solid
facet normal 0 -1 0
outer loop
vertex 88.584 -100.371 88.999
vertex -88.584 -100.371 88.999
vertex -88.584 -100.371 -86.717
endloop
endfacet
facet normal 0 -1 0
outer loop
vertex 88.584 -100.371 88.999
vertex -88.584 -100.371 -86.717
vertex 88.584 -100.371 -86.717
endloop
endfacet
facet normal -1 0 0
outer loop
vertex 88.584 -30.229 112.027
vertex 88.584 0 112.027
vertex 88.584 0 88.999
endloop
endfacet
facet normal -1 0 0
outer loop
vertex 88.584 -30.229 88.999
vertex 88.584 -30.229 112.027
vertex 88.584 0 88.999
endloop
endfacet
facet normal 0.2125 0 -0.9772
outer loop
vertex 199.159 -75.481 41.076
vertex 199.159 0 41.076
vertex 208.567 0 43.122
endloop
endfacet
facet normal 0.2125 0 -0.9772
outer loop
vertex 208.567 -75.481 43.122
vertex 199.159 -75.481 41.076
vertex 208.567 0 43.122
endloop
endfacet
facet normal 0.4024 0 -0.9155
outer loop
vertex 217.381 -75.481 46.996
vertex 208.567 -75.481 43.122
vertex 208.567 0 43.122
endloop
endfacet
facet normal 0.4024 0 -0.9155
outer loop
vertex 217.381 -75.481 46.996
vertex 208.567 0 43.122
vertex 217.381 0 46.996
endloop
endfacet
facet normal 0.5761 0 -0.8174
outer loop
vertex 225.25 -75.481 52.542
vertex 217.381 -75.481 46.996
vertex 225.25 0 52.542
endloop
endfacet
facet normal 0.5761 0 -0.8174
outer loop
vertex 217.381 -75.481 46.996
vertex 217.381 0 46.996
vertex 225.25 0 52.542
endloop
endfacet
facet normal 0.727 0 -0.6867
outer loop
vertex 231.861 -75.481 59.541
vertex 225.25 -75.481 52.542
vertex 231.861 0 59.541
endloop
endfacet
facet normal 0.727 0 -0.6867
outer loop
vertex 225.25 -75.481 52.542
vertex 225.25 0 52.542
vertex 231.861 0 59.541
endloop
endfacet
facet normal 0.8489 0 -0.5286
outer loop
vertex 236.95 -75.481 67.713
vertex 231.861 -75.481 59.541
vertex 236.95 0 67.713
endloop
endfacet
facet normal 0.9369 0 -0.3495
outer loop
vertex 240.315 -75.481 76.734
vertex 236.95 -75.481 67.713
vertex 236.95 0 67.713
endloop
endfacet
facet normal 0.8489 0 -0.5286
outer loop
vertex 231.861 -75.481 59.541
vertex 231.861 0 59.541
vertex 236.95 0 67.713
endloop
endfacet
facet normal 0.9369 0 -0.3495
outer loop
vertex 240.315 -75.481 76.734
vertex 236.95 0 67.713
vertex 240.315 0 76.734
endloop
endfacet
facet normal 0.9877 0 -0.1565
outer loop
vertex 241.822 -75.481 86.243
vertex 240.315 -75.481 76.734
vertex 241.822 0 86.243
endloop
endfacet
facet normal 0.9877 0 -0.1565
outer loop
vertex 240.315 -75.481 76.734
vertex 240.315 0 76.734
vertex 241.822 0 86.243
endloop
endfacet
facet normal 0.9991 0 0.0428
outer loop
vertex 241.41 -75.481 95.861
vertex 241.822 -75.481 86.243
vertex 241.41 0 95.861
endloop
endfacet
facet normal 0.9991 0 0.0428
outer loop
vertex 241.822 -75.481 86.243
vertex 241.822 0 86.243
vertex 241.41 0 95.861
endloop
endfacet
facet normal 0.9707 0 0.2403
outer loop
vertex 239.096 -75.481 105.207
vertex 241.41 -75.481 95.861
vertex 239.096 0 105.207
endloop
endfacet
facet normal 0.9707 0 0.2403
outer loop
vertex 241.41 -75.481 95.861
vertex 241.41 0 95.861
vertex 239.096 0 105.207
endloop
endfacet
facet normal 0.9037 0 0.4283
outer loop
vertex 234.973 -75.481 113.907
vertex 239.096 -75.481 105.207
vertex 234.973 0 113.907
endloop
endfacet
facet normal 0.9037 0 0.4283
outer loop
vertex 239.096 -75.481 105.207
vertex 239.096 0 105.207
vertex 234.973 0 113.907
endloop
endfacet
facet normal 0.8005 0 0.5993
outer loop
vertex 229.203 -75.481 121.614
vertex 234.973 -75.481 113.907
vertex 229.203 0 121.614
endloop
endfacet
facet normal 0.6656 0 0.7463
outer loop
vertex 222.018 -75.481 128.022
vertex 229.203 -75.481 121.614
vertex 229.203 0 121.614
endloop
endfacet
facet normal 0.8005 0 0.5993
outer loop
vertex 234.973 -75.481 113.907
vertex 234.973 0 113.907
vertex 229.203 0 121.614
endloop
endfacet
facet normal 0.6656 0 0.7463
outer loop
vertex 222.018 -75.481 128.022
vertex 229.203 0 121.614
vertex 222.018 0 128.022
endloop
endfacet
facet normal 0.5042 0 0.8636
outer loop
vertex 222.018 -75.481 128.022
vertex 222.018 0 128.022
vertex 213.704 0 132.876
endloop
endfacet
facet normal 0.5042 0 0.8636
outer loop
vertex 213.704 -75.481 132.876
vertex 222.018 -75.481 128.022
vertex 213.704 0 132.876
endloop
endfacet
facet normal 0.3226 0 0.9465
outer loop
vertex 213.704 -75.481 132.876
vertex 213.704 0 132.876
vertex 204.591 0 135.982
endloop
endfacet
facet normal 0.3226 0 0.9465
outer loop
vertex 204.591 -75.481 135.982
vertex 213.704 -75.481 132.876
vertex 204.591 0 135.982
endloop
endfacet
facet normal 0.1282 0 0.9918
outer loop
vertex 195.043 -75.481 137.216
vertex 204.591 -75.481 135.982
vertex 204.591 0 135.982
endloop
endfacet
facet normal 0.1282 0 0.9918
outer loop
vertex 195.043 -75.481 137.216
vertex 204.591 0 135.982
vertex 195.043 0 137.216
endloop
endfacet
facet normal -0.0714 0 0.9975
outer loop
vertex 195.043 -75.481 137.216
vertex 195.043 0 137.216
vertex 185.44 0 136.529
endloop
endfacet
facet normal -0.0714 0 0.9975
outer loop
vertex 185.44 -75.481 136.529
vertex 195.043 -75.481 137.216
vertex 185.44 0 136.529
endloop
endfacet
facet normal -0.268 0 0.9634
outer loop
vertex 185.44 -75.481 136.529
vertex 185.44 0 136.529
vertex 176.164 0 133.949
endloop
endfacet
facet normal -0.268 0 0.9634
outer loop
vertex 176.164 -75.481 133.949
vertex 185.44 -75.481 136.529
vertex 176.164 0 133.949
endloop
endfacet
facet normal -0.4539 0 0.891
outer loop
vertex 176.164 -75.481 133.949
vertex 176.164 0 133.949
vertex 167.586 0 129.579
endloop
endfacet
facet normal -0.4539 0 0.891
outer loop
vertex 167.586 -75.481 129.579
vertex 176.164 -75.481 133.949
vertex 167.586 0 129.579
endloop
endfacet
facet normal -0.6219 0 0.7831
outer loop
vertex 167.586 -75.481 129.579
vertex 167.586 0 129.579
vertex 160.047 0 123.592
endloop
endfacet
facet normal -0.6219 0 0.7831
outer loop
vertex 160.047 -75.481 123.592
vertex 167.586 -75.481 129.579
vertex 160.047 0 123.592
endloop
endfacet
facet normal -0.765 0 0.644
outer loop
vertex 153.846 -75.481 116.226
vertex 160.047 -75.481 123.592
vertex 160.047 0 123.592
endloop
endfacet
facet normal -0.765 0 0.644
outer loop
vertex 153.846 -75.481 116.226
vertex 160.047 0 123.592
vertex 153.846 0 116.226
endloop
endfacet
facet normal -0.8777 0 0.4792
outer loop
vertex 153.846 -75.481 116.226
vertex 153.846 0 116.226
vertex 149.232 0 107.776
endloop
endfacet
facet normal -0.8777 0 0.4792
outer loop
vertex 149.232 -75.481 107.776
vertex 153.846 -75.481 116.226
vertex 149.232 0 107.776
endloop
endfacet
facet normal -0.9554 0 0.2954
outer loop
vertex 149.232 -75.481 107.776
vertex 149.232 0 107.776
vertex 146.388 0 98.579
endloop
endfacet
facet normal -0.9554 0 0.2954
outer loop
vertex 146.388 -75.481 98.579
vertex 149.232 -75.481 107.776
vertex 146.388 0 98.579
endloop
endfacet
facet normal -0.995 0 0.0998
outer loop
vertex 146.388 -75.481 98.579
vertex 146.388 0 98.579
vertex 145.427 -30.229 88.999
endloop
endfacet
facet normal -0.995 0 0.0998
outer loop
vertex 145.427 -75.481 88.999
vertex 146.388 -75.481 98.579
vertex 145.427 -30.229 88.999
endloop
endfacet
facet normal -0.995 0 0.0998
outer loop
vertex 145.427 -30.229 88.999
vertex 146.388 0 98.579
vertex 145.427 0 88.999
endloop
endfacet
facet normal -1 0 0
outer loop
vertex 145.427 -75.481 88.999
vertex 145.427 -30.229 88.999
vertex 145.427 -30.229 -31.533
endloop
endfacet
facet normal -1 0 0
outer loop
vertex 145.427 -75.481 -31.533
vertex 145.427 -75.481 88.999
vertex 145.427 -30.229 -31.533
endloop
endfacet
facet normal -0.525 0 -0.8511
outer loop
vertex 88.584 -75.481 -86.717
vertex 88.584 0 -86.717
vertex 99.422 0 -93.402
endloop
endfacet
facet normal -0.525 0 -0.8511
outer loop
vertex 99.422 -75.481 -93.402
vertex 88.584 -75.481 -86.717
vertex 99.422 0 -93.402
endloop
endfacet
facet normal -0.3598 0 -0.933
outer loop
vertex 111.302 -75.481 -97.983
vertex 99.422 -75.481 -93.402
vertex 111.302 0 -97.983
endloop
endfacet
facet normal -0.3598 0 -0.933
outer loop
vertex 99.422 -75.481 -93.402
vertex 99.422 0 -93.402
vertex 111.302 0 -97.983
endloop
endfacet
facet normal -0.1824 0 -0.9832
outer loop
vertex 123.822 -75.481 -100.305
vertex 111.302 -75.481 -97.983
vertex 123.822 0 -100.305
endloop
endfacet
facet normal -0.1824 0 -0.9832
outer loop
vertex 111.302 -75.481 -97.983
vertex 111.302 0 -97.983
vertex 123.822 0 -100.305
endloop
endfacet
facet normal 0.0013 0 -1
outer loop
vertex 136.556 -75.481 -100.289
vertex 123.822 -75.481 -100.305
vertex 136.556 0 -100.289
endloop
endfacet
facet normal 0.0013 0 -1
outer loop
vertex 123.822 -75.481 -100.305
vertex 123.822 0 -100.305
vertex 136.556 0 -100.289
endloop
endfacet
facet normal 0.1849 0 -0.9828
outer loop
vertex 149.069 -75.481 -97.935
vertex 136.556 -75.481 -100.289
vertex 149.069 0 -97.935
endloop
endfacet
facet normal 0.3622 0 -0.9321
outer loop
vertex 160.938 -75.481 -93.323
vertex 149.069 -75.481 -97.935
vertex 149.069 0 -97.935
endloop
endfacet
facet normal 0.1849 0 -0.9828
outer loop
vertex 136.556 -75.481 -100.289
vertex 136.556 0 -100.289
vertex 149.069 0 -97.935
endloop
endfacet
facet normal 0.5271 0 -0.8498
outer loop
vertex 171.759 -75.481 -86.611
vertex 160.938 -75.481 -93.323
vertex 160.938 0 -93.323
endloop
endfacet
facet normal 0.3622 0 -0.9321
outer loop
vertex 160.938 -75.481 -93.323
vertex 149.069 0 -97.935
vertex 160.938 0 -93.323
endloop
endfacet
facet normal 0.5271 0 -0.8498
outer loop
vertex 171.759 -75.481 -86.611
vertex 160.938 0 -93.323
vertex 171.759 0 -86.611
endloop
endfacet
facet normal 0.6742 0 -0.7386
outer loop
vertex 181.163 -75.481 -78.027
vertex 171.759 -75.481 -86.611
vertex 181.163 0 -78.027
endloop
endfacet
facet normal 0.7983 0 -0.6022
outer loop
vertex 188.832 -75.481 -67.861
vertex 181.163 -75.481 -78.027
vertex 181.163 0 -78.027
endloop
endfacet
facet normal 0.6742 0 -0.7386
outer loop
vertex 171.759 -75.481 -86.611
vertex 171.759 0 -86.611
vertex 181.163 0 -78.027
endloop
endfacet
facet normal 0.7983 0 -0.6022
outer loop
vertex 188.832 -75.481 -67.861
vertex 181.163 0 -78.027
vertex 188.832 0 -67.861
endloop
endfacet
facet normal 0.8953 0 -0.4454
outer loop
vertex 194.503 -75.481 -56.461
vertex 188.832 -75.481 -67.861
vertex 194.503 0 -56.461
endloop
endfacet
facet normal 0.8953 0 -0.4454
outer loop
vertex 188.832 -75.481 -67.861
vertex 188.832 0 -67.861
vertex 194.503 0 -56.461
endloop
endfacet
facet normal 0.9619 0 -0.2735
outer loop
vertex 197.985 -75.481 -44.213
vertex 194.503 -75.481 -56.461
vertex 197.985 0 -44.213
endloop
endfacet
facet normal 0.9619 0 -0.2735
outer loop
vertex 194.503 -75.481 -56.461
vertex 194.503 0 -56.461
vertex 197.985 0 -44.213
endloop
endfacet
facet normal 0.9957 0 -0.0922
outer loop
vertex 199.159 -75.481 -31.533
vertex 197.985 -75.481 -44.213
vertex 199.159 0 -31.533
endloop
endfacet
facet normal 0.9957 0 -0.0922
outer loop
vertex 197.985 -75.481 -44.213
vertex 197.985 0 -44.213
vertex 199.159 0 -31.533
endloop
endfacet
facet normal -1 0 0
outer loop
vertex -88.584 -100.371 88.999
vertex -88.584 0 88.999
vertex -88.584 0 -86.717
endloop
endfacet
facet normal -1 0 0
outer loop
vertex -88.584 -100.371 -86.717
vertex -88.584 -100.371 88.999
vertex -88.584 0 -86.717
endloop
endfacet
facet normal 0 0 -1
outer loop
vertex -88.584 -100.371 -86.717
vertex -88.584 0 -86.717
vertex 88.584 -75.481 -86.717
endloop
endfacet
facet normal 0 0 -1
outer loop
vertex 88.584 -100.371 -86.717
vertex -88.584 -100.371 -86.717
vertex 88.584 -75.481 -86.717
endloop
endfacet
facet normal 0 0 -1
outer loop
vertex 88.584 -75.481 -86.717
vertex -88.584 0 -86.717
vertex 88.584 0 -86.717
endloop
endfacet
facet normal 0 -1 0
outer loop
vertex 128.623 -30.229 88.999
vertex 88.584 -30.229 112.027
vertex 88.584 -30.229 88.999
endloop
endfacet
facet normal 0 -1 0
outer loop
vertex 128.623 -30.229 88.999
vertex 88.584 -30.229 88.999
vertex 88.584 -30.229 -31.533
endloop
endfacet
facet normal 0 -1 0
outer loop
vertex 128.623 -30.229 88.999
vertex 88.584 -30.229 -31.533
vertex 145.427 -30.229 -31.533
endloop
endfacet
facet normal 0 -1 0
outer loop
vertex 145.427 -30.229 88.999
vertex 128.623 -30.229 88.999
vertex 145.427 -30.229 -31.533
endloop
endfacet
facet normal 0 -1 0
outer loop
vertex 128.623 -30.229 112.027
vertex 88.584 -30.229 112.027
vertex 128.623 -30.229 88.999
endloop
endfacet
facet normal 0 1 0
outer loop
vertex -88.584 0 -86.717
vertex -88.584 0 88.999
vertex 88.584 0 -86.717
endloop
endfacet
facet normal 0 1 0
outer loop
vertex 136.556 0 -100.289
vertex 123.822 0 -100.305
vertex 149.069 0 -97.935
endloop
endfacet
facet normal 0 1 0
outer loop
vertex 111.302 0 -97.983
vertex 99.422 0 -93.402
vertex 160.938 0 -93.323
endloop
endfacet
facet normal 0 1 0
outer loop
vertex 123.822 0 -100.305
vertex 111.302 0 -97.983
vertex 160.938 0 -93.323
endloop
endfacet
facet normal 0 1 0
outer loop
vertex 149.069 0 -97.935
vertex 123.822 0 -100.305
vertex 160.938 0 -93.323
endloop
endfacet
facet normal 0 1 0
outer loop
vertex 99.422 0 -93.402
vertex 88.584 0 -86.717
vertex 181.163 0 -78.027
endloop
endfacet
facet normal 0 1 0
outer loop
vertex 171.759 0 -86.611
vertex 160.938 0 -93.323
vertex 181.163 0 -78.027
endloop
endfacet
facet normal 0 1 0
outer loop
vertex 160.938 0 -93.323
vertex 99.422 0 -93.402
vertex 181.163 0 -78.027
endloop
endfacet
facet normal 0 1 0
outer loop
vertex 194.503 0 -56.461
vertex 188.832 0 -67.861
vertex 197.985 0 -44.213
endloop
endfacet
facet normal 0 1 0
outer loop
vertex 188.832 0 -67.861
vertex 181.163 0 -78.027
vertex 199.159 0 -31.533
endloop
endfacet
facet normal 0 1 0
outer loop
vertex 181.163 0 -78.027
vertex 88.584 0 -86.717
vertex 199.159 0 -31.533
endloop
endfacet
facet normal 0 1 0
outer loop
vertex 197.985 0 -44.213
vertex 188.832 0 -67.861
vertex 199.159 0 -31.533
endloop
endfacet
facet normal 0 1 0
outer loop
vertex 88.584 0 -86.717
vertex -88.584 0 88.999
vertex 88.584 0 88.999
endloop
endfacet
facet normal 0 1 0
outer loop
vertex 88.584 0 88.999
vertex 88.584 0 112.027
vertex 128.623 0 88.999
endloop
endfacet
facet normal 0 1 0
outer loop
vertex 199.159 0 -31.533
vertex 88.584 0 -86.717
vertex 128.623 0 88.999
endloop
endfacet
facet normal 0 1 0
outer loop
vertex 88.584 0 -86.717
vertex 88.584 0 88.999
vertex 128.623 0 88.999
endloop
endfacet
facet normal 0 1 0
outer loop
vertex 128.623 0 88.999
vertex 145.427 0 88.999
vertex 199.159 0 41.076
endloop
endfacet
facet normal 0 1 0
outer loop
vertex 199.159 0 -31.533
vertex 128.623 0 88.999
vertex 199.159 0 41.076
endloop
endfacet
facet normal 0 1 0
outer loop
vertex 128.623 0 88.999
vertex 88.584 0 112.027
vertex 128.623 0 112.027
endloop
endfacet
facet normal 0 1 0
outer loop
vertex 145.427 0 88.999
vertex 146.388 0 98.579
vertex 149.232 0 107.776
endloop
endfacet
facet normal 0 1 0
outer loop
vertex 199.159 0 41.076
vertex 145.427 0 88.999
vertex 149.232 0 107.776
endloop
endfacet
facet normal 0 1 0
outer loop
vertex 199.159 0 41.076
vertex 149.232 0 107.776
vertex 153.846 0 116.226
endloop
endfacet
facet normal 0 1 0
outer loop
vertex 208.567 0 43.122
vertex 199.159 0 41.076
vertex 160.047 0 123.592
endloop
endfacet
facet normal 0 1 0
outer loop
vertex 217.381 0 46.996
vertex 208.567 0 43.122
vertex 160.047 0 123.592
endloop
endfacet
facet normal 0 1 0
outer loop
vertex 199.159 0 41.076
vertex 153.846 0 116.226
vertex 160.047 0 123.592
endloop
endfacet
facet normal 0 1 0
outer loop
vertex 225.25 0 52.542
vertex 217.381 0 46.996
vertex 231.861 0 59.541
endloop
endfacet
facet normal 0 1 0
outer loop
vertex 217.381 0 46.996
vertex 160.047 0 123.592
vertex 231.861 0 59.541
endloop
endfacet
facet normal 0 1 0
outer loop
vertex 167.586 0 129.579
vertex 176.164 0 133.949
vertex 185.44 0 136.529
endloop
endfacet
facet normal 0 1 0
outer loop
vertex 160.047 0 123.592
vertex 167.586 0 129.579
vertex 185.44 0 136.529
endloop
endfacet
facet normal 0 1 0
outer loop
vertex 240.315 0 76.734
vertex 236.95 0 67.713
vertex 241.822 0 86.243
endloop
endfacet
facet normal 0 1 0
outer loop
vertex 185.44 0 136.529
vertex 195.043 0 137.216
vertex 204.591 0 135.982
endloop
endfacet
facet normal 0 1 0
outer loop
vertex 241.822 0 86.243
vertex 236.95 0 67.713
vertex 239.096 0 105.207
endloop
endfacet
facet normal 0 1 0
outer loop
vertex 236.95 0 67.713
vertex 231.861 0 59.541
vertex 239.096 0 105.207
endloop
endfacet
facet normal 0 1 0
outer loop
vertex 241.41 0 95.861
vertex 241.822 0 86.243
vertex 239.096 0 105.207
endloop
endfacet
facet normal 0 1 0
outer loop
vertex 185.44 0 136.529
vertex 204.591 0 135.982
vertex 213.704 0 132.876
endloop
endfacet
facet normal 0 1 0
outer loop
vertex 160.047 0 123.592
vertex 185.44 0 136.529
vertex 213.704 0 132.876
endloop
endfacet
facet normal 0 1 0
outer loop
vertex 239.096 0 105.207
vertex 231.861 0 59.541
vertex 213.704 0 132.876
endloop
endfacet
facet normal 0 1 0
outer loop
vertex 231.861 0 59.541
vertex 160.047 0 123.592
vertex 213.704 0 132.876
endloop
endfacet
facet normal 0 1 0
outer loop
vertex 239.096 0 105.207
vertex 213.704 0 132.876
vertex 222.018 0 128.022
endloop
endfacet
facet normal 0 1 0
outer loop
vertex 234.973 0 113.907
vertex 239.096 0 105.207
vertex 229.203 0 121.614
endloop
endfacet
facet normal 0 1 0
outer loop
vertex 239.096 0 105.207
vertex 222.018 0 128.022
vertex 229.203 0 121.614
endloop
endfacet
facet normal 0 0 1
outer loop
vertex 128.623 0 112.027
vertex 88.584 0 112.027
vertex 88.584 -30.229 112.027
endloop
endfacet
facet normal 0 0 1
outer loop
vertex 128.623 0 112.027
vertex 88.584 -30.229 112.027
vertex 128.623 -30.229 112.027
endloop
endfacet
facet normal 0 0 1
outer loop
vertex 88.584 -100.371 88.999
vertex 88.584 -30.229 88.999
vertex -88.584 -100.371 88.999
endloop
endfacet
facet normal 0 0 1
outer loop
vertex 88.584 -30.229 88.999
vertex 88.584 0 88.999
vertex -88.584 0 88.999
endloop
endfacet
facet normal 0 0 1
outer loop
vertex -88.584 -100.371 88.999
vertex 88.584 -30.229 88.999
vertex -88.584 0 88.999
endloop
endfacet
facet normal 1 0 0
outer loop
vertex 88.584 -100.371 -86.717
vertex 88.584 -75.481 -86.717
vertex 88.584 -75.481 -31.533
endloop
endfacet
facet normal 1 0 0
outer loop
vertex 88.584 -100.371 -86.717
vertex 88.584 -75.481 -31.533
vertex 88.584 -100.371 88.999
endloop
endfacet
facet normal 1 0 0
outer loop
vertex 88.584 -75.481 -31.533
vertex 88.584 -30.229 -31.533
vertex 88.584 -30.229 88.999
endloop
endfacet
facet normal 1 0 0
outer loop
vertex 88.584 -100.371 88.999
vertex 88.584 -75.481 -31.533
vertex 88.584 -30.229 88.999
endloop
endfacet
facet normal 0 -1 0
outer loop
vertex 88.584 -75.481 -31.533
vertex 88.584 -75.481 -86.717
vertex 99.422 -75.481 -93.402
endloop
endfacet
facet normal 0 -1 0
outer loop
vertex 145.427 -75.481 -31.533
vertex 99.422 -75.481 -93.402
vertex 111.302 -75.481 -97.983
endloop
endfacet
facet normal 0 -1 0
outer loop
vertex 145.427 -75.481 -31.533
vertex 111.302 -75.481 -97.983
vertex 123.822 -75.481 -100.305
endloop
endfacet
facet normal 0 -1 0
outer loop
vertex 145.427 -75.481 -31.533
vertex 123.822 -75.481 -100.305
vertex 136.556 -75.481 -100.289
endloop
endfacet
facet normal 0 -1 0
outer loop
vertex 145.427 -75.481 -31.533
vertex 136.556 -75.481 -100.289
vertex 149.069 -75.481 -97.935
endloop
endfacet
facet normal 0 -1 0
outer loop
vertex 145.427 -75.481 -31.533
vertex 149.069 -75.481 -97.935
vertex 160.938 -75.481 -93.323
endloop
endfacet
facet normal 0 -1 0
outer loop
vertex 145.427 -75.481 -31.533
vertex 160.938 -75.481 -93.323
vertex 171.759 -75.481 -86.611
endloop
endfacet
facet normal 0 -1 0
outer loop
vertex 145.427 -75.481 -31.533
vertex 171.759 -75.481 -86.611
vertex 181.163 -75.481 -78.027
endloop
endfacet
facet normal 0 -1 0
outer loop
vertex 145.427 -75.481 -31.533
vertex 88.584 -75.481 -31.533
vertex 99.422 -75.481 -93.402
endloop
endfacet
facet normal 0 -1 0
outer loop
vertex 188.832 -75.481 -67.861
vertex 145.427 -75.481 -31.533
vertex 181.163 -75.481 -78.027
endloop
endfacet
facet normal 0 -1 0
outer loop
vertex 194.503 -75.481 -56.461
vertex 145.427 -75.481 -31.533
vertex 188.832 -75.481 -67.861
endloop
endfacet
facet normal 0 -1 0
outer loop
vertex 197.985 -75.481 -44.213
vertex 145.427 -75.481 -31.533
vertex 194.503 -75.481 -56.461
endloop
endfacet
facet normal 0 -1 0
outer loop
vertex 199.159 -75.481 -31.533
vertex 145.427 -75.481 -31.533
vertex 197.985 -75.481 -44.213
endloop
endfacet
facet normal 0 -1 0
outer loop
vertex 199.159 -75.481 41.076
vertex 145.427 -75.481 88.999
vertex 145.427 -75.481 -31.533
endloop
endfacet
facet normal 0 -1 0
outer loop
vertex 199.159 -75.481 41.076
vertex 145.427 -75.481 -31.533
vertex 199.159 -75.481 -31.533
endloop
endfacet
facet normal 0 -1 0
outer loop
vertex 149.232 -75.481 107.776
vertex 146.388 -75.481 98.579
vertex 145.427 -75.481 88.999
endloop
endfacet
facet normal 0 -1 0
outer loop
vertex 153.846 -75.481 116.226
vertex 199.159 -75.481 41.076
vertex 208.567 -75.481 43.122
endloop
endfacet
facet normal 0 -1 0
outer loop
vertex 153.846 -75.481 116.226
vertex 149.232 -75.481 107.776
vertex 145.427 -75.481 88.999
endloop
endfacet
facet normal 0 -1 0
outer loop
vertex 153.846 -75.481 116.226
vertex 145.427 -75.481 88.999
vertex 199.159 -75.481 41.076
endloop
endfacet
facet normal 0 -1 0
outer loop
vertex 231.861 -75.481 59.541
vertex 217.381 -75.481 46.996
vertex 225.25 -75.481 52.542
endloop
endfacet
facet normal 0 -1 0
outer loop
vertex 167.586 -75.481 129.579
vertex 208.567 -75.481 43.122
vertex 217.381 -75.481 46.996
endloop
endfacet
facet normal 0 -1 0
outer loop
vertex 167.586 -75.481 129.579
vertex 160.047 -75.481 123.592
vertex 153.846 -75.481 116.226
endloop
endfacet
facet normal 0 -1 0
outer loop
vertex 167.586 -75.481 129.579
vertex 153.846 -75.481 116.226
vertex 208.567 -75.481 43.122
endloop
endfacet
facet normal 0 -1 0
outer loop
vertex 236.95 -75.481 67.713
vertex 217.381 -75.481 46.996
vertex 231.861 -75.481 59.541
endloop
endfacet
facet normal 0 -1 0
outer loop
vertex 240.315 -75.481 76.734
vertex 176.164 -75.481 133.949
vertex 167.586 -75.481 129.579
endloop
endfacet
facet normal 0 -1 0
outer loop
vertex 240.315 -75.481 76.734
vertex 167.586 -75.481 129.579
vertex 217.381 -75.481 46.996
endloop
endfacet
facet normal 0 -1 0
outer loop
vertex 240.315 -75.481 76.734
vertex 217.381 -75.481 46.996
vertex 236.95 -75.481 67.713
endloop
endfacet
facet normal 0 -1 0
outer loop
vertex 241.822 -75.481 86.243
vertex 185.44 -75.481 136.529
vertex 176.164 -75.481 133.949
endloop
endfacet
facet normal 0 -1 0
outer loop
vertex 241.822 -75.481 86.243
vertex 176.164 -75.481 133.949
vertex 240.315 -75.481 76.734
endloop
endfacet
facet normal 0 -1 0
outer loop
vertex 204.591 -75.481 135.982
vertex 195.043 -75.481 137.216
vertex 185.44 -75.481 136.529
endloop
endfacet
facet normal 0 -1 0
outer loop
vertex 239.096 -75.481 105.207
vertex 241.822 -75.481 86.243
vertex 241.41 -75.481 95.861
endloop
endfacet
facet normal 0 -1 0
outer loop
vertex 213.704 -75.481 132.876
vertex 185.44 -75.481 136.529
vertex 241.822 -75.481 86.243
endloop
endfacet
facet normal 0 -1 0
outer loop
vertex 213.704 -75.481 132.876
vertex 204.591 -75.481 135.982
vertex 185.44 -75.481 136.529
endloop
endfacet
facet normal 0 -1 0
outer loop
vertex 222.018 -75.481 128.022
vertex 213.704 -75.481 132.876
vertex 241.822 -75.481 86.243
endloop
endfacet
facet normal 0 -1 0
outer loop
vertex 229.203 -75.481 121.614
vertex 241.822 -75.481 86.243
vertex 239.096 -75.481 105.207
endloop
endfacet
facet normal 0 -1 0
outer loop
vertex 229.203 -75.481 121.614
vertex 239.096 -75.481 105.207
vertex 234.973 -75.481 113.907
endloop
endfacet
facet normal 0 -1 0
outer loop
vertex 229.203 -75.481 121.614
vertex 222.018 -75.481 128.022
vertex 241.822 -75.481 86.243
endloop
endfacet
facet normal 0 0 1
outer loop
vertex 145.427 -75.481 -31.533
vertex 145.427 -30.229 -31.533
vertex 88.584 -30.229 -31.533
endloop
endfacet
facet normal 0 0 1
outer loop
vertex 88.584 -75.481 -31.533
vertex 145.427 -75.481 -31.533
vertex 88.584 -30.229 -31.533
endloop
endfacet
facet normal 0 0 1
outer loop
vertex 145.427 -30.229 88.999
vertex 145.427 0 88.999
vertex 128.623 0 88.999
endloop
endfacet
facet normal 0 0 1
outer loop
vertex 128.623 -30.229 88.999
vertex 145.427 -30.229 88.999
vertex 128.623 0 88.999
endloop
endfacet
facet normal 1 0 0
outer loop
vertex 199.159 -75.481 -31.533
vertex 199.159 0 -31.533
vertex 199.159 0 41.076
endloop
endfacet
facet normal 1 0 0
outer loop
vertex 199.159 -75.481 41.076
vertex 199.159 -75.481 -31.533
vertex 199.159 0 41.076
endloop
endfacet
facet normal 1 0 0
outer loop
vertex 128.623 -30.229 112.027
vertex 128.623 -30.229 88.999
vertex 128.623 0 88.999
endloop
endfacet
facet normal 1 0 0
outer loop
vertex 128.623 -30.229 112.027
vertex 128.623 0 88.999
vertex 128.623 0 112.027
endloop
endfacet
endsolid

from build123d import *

# Parameters (mm, degrees)
F0_W     = 53.7313818932
F0_H     = 72.609975934
F1_DEPTH = 75.4805505276
F0_W_2   = 40.0392413139
F0_H_2   = 23.0277478695
F2_DEPTH = 30.2285254002
F3_DEPTH = 100.3713980317


with BuildPart() as f1:
    # F0 (on Front) → F1 (new body)
    with BuildSketch(Plane.XZ):
        with Locations((172.2931265831, 4.7715082765)):
            Rectangle(F0_W, F0_H)
        with BuildLine():
            ThreePointArc((199.1588175297, 41.0764962435), (225.7710662807, 124.9978706097), (145.4274356365, 88.9991223812))
            Line((145.4274356365, 88.9991223812), (145.4274356365, 41.0764962435))
            Line((145.4274356365, 41.0764962435), (199.1588175297, 41.0764962435))
        make_face()
        with BuildLine():
            Line((145.4274356365, -31.5334796906), (88.5841548443, -31.5334796906))
            Line((88.5841548443, -31.5334796906), (88.5841548443, -86.717069149))
            ThreePointArc((88.5841548443, -86.717069149), (160.9384717068, -93.3234153061), (199.1588175297, -31.5334796906))
            Line((199.1588175297, -31.5334796906), (145.4274356365, -31.5334796906))
        make_face()
    extrude(amount=F1_DEPTH)

    # F0 (on Front) → F2 (join)
    with BuildSketch(Plane.XZ):
        Polygon((128.6233961582, 88.9991223812), (88.5841548443, 88.9991223812), (88.5841548443, -31.5334796906), (145.4274356365, -31.5334796906), (145.4274356365, 41.0764962435), (145.4274356365, 88.9991223812), align=None)
        with Locations((108.6037755013, 100.512996316)):
            Rectangle(F0_W_2, F0_H_2)
        with BuildLine():
            Line((145.4274356365, -31.5334796906), (88.5841548443, -31.5334796906))
            Line((88.5841548443, -31.5334796906), (88.5841548443, -86.717069149))
            ThreePointArc((88.5841548443, -86.717069149), (160.9384717068, -93.3234153061), (199.1588175297, -31.5334796906))
            Line((199.1588175297, -31.5334796906), (145.4274356365, -31.5334796906))
        make_face()
        with BuildLine():
            ThreePointArc((199.1588175297, 41.0764962435), (225.7710662807, 124.9978706097), (145.4274356365, 88.9991223812))
            Line((145.4274356365, 88.9991223812), (145.4274356365, 41.0764962435))
            Line((145.4274356365, 41.0764962435), (199.1588175297, 41.0764962435))
        make_face()
        with Locations((172.2931265831, 4.7715082765)):
            Rectangle(F0_W, F0_H)
    extrude(amount=F2_DEPTH)

    # F0 (on Front) → F3 (join)
    with BuildSketch(Plane.XZ):
        Polygon((88.5841548443, -31.5334796906), (88.5841548443, 88.9991223812), (-88.5842293501, 88.9991223812), (-88.5842293501, -86.717069149), (88.5841548443, -86.717069149), align=None)
    extrude(amount=F3_DEPTH)


solid = f1.part
